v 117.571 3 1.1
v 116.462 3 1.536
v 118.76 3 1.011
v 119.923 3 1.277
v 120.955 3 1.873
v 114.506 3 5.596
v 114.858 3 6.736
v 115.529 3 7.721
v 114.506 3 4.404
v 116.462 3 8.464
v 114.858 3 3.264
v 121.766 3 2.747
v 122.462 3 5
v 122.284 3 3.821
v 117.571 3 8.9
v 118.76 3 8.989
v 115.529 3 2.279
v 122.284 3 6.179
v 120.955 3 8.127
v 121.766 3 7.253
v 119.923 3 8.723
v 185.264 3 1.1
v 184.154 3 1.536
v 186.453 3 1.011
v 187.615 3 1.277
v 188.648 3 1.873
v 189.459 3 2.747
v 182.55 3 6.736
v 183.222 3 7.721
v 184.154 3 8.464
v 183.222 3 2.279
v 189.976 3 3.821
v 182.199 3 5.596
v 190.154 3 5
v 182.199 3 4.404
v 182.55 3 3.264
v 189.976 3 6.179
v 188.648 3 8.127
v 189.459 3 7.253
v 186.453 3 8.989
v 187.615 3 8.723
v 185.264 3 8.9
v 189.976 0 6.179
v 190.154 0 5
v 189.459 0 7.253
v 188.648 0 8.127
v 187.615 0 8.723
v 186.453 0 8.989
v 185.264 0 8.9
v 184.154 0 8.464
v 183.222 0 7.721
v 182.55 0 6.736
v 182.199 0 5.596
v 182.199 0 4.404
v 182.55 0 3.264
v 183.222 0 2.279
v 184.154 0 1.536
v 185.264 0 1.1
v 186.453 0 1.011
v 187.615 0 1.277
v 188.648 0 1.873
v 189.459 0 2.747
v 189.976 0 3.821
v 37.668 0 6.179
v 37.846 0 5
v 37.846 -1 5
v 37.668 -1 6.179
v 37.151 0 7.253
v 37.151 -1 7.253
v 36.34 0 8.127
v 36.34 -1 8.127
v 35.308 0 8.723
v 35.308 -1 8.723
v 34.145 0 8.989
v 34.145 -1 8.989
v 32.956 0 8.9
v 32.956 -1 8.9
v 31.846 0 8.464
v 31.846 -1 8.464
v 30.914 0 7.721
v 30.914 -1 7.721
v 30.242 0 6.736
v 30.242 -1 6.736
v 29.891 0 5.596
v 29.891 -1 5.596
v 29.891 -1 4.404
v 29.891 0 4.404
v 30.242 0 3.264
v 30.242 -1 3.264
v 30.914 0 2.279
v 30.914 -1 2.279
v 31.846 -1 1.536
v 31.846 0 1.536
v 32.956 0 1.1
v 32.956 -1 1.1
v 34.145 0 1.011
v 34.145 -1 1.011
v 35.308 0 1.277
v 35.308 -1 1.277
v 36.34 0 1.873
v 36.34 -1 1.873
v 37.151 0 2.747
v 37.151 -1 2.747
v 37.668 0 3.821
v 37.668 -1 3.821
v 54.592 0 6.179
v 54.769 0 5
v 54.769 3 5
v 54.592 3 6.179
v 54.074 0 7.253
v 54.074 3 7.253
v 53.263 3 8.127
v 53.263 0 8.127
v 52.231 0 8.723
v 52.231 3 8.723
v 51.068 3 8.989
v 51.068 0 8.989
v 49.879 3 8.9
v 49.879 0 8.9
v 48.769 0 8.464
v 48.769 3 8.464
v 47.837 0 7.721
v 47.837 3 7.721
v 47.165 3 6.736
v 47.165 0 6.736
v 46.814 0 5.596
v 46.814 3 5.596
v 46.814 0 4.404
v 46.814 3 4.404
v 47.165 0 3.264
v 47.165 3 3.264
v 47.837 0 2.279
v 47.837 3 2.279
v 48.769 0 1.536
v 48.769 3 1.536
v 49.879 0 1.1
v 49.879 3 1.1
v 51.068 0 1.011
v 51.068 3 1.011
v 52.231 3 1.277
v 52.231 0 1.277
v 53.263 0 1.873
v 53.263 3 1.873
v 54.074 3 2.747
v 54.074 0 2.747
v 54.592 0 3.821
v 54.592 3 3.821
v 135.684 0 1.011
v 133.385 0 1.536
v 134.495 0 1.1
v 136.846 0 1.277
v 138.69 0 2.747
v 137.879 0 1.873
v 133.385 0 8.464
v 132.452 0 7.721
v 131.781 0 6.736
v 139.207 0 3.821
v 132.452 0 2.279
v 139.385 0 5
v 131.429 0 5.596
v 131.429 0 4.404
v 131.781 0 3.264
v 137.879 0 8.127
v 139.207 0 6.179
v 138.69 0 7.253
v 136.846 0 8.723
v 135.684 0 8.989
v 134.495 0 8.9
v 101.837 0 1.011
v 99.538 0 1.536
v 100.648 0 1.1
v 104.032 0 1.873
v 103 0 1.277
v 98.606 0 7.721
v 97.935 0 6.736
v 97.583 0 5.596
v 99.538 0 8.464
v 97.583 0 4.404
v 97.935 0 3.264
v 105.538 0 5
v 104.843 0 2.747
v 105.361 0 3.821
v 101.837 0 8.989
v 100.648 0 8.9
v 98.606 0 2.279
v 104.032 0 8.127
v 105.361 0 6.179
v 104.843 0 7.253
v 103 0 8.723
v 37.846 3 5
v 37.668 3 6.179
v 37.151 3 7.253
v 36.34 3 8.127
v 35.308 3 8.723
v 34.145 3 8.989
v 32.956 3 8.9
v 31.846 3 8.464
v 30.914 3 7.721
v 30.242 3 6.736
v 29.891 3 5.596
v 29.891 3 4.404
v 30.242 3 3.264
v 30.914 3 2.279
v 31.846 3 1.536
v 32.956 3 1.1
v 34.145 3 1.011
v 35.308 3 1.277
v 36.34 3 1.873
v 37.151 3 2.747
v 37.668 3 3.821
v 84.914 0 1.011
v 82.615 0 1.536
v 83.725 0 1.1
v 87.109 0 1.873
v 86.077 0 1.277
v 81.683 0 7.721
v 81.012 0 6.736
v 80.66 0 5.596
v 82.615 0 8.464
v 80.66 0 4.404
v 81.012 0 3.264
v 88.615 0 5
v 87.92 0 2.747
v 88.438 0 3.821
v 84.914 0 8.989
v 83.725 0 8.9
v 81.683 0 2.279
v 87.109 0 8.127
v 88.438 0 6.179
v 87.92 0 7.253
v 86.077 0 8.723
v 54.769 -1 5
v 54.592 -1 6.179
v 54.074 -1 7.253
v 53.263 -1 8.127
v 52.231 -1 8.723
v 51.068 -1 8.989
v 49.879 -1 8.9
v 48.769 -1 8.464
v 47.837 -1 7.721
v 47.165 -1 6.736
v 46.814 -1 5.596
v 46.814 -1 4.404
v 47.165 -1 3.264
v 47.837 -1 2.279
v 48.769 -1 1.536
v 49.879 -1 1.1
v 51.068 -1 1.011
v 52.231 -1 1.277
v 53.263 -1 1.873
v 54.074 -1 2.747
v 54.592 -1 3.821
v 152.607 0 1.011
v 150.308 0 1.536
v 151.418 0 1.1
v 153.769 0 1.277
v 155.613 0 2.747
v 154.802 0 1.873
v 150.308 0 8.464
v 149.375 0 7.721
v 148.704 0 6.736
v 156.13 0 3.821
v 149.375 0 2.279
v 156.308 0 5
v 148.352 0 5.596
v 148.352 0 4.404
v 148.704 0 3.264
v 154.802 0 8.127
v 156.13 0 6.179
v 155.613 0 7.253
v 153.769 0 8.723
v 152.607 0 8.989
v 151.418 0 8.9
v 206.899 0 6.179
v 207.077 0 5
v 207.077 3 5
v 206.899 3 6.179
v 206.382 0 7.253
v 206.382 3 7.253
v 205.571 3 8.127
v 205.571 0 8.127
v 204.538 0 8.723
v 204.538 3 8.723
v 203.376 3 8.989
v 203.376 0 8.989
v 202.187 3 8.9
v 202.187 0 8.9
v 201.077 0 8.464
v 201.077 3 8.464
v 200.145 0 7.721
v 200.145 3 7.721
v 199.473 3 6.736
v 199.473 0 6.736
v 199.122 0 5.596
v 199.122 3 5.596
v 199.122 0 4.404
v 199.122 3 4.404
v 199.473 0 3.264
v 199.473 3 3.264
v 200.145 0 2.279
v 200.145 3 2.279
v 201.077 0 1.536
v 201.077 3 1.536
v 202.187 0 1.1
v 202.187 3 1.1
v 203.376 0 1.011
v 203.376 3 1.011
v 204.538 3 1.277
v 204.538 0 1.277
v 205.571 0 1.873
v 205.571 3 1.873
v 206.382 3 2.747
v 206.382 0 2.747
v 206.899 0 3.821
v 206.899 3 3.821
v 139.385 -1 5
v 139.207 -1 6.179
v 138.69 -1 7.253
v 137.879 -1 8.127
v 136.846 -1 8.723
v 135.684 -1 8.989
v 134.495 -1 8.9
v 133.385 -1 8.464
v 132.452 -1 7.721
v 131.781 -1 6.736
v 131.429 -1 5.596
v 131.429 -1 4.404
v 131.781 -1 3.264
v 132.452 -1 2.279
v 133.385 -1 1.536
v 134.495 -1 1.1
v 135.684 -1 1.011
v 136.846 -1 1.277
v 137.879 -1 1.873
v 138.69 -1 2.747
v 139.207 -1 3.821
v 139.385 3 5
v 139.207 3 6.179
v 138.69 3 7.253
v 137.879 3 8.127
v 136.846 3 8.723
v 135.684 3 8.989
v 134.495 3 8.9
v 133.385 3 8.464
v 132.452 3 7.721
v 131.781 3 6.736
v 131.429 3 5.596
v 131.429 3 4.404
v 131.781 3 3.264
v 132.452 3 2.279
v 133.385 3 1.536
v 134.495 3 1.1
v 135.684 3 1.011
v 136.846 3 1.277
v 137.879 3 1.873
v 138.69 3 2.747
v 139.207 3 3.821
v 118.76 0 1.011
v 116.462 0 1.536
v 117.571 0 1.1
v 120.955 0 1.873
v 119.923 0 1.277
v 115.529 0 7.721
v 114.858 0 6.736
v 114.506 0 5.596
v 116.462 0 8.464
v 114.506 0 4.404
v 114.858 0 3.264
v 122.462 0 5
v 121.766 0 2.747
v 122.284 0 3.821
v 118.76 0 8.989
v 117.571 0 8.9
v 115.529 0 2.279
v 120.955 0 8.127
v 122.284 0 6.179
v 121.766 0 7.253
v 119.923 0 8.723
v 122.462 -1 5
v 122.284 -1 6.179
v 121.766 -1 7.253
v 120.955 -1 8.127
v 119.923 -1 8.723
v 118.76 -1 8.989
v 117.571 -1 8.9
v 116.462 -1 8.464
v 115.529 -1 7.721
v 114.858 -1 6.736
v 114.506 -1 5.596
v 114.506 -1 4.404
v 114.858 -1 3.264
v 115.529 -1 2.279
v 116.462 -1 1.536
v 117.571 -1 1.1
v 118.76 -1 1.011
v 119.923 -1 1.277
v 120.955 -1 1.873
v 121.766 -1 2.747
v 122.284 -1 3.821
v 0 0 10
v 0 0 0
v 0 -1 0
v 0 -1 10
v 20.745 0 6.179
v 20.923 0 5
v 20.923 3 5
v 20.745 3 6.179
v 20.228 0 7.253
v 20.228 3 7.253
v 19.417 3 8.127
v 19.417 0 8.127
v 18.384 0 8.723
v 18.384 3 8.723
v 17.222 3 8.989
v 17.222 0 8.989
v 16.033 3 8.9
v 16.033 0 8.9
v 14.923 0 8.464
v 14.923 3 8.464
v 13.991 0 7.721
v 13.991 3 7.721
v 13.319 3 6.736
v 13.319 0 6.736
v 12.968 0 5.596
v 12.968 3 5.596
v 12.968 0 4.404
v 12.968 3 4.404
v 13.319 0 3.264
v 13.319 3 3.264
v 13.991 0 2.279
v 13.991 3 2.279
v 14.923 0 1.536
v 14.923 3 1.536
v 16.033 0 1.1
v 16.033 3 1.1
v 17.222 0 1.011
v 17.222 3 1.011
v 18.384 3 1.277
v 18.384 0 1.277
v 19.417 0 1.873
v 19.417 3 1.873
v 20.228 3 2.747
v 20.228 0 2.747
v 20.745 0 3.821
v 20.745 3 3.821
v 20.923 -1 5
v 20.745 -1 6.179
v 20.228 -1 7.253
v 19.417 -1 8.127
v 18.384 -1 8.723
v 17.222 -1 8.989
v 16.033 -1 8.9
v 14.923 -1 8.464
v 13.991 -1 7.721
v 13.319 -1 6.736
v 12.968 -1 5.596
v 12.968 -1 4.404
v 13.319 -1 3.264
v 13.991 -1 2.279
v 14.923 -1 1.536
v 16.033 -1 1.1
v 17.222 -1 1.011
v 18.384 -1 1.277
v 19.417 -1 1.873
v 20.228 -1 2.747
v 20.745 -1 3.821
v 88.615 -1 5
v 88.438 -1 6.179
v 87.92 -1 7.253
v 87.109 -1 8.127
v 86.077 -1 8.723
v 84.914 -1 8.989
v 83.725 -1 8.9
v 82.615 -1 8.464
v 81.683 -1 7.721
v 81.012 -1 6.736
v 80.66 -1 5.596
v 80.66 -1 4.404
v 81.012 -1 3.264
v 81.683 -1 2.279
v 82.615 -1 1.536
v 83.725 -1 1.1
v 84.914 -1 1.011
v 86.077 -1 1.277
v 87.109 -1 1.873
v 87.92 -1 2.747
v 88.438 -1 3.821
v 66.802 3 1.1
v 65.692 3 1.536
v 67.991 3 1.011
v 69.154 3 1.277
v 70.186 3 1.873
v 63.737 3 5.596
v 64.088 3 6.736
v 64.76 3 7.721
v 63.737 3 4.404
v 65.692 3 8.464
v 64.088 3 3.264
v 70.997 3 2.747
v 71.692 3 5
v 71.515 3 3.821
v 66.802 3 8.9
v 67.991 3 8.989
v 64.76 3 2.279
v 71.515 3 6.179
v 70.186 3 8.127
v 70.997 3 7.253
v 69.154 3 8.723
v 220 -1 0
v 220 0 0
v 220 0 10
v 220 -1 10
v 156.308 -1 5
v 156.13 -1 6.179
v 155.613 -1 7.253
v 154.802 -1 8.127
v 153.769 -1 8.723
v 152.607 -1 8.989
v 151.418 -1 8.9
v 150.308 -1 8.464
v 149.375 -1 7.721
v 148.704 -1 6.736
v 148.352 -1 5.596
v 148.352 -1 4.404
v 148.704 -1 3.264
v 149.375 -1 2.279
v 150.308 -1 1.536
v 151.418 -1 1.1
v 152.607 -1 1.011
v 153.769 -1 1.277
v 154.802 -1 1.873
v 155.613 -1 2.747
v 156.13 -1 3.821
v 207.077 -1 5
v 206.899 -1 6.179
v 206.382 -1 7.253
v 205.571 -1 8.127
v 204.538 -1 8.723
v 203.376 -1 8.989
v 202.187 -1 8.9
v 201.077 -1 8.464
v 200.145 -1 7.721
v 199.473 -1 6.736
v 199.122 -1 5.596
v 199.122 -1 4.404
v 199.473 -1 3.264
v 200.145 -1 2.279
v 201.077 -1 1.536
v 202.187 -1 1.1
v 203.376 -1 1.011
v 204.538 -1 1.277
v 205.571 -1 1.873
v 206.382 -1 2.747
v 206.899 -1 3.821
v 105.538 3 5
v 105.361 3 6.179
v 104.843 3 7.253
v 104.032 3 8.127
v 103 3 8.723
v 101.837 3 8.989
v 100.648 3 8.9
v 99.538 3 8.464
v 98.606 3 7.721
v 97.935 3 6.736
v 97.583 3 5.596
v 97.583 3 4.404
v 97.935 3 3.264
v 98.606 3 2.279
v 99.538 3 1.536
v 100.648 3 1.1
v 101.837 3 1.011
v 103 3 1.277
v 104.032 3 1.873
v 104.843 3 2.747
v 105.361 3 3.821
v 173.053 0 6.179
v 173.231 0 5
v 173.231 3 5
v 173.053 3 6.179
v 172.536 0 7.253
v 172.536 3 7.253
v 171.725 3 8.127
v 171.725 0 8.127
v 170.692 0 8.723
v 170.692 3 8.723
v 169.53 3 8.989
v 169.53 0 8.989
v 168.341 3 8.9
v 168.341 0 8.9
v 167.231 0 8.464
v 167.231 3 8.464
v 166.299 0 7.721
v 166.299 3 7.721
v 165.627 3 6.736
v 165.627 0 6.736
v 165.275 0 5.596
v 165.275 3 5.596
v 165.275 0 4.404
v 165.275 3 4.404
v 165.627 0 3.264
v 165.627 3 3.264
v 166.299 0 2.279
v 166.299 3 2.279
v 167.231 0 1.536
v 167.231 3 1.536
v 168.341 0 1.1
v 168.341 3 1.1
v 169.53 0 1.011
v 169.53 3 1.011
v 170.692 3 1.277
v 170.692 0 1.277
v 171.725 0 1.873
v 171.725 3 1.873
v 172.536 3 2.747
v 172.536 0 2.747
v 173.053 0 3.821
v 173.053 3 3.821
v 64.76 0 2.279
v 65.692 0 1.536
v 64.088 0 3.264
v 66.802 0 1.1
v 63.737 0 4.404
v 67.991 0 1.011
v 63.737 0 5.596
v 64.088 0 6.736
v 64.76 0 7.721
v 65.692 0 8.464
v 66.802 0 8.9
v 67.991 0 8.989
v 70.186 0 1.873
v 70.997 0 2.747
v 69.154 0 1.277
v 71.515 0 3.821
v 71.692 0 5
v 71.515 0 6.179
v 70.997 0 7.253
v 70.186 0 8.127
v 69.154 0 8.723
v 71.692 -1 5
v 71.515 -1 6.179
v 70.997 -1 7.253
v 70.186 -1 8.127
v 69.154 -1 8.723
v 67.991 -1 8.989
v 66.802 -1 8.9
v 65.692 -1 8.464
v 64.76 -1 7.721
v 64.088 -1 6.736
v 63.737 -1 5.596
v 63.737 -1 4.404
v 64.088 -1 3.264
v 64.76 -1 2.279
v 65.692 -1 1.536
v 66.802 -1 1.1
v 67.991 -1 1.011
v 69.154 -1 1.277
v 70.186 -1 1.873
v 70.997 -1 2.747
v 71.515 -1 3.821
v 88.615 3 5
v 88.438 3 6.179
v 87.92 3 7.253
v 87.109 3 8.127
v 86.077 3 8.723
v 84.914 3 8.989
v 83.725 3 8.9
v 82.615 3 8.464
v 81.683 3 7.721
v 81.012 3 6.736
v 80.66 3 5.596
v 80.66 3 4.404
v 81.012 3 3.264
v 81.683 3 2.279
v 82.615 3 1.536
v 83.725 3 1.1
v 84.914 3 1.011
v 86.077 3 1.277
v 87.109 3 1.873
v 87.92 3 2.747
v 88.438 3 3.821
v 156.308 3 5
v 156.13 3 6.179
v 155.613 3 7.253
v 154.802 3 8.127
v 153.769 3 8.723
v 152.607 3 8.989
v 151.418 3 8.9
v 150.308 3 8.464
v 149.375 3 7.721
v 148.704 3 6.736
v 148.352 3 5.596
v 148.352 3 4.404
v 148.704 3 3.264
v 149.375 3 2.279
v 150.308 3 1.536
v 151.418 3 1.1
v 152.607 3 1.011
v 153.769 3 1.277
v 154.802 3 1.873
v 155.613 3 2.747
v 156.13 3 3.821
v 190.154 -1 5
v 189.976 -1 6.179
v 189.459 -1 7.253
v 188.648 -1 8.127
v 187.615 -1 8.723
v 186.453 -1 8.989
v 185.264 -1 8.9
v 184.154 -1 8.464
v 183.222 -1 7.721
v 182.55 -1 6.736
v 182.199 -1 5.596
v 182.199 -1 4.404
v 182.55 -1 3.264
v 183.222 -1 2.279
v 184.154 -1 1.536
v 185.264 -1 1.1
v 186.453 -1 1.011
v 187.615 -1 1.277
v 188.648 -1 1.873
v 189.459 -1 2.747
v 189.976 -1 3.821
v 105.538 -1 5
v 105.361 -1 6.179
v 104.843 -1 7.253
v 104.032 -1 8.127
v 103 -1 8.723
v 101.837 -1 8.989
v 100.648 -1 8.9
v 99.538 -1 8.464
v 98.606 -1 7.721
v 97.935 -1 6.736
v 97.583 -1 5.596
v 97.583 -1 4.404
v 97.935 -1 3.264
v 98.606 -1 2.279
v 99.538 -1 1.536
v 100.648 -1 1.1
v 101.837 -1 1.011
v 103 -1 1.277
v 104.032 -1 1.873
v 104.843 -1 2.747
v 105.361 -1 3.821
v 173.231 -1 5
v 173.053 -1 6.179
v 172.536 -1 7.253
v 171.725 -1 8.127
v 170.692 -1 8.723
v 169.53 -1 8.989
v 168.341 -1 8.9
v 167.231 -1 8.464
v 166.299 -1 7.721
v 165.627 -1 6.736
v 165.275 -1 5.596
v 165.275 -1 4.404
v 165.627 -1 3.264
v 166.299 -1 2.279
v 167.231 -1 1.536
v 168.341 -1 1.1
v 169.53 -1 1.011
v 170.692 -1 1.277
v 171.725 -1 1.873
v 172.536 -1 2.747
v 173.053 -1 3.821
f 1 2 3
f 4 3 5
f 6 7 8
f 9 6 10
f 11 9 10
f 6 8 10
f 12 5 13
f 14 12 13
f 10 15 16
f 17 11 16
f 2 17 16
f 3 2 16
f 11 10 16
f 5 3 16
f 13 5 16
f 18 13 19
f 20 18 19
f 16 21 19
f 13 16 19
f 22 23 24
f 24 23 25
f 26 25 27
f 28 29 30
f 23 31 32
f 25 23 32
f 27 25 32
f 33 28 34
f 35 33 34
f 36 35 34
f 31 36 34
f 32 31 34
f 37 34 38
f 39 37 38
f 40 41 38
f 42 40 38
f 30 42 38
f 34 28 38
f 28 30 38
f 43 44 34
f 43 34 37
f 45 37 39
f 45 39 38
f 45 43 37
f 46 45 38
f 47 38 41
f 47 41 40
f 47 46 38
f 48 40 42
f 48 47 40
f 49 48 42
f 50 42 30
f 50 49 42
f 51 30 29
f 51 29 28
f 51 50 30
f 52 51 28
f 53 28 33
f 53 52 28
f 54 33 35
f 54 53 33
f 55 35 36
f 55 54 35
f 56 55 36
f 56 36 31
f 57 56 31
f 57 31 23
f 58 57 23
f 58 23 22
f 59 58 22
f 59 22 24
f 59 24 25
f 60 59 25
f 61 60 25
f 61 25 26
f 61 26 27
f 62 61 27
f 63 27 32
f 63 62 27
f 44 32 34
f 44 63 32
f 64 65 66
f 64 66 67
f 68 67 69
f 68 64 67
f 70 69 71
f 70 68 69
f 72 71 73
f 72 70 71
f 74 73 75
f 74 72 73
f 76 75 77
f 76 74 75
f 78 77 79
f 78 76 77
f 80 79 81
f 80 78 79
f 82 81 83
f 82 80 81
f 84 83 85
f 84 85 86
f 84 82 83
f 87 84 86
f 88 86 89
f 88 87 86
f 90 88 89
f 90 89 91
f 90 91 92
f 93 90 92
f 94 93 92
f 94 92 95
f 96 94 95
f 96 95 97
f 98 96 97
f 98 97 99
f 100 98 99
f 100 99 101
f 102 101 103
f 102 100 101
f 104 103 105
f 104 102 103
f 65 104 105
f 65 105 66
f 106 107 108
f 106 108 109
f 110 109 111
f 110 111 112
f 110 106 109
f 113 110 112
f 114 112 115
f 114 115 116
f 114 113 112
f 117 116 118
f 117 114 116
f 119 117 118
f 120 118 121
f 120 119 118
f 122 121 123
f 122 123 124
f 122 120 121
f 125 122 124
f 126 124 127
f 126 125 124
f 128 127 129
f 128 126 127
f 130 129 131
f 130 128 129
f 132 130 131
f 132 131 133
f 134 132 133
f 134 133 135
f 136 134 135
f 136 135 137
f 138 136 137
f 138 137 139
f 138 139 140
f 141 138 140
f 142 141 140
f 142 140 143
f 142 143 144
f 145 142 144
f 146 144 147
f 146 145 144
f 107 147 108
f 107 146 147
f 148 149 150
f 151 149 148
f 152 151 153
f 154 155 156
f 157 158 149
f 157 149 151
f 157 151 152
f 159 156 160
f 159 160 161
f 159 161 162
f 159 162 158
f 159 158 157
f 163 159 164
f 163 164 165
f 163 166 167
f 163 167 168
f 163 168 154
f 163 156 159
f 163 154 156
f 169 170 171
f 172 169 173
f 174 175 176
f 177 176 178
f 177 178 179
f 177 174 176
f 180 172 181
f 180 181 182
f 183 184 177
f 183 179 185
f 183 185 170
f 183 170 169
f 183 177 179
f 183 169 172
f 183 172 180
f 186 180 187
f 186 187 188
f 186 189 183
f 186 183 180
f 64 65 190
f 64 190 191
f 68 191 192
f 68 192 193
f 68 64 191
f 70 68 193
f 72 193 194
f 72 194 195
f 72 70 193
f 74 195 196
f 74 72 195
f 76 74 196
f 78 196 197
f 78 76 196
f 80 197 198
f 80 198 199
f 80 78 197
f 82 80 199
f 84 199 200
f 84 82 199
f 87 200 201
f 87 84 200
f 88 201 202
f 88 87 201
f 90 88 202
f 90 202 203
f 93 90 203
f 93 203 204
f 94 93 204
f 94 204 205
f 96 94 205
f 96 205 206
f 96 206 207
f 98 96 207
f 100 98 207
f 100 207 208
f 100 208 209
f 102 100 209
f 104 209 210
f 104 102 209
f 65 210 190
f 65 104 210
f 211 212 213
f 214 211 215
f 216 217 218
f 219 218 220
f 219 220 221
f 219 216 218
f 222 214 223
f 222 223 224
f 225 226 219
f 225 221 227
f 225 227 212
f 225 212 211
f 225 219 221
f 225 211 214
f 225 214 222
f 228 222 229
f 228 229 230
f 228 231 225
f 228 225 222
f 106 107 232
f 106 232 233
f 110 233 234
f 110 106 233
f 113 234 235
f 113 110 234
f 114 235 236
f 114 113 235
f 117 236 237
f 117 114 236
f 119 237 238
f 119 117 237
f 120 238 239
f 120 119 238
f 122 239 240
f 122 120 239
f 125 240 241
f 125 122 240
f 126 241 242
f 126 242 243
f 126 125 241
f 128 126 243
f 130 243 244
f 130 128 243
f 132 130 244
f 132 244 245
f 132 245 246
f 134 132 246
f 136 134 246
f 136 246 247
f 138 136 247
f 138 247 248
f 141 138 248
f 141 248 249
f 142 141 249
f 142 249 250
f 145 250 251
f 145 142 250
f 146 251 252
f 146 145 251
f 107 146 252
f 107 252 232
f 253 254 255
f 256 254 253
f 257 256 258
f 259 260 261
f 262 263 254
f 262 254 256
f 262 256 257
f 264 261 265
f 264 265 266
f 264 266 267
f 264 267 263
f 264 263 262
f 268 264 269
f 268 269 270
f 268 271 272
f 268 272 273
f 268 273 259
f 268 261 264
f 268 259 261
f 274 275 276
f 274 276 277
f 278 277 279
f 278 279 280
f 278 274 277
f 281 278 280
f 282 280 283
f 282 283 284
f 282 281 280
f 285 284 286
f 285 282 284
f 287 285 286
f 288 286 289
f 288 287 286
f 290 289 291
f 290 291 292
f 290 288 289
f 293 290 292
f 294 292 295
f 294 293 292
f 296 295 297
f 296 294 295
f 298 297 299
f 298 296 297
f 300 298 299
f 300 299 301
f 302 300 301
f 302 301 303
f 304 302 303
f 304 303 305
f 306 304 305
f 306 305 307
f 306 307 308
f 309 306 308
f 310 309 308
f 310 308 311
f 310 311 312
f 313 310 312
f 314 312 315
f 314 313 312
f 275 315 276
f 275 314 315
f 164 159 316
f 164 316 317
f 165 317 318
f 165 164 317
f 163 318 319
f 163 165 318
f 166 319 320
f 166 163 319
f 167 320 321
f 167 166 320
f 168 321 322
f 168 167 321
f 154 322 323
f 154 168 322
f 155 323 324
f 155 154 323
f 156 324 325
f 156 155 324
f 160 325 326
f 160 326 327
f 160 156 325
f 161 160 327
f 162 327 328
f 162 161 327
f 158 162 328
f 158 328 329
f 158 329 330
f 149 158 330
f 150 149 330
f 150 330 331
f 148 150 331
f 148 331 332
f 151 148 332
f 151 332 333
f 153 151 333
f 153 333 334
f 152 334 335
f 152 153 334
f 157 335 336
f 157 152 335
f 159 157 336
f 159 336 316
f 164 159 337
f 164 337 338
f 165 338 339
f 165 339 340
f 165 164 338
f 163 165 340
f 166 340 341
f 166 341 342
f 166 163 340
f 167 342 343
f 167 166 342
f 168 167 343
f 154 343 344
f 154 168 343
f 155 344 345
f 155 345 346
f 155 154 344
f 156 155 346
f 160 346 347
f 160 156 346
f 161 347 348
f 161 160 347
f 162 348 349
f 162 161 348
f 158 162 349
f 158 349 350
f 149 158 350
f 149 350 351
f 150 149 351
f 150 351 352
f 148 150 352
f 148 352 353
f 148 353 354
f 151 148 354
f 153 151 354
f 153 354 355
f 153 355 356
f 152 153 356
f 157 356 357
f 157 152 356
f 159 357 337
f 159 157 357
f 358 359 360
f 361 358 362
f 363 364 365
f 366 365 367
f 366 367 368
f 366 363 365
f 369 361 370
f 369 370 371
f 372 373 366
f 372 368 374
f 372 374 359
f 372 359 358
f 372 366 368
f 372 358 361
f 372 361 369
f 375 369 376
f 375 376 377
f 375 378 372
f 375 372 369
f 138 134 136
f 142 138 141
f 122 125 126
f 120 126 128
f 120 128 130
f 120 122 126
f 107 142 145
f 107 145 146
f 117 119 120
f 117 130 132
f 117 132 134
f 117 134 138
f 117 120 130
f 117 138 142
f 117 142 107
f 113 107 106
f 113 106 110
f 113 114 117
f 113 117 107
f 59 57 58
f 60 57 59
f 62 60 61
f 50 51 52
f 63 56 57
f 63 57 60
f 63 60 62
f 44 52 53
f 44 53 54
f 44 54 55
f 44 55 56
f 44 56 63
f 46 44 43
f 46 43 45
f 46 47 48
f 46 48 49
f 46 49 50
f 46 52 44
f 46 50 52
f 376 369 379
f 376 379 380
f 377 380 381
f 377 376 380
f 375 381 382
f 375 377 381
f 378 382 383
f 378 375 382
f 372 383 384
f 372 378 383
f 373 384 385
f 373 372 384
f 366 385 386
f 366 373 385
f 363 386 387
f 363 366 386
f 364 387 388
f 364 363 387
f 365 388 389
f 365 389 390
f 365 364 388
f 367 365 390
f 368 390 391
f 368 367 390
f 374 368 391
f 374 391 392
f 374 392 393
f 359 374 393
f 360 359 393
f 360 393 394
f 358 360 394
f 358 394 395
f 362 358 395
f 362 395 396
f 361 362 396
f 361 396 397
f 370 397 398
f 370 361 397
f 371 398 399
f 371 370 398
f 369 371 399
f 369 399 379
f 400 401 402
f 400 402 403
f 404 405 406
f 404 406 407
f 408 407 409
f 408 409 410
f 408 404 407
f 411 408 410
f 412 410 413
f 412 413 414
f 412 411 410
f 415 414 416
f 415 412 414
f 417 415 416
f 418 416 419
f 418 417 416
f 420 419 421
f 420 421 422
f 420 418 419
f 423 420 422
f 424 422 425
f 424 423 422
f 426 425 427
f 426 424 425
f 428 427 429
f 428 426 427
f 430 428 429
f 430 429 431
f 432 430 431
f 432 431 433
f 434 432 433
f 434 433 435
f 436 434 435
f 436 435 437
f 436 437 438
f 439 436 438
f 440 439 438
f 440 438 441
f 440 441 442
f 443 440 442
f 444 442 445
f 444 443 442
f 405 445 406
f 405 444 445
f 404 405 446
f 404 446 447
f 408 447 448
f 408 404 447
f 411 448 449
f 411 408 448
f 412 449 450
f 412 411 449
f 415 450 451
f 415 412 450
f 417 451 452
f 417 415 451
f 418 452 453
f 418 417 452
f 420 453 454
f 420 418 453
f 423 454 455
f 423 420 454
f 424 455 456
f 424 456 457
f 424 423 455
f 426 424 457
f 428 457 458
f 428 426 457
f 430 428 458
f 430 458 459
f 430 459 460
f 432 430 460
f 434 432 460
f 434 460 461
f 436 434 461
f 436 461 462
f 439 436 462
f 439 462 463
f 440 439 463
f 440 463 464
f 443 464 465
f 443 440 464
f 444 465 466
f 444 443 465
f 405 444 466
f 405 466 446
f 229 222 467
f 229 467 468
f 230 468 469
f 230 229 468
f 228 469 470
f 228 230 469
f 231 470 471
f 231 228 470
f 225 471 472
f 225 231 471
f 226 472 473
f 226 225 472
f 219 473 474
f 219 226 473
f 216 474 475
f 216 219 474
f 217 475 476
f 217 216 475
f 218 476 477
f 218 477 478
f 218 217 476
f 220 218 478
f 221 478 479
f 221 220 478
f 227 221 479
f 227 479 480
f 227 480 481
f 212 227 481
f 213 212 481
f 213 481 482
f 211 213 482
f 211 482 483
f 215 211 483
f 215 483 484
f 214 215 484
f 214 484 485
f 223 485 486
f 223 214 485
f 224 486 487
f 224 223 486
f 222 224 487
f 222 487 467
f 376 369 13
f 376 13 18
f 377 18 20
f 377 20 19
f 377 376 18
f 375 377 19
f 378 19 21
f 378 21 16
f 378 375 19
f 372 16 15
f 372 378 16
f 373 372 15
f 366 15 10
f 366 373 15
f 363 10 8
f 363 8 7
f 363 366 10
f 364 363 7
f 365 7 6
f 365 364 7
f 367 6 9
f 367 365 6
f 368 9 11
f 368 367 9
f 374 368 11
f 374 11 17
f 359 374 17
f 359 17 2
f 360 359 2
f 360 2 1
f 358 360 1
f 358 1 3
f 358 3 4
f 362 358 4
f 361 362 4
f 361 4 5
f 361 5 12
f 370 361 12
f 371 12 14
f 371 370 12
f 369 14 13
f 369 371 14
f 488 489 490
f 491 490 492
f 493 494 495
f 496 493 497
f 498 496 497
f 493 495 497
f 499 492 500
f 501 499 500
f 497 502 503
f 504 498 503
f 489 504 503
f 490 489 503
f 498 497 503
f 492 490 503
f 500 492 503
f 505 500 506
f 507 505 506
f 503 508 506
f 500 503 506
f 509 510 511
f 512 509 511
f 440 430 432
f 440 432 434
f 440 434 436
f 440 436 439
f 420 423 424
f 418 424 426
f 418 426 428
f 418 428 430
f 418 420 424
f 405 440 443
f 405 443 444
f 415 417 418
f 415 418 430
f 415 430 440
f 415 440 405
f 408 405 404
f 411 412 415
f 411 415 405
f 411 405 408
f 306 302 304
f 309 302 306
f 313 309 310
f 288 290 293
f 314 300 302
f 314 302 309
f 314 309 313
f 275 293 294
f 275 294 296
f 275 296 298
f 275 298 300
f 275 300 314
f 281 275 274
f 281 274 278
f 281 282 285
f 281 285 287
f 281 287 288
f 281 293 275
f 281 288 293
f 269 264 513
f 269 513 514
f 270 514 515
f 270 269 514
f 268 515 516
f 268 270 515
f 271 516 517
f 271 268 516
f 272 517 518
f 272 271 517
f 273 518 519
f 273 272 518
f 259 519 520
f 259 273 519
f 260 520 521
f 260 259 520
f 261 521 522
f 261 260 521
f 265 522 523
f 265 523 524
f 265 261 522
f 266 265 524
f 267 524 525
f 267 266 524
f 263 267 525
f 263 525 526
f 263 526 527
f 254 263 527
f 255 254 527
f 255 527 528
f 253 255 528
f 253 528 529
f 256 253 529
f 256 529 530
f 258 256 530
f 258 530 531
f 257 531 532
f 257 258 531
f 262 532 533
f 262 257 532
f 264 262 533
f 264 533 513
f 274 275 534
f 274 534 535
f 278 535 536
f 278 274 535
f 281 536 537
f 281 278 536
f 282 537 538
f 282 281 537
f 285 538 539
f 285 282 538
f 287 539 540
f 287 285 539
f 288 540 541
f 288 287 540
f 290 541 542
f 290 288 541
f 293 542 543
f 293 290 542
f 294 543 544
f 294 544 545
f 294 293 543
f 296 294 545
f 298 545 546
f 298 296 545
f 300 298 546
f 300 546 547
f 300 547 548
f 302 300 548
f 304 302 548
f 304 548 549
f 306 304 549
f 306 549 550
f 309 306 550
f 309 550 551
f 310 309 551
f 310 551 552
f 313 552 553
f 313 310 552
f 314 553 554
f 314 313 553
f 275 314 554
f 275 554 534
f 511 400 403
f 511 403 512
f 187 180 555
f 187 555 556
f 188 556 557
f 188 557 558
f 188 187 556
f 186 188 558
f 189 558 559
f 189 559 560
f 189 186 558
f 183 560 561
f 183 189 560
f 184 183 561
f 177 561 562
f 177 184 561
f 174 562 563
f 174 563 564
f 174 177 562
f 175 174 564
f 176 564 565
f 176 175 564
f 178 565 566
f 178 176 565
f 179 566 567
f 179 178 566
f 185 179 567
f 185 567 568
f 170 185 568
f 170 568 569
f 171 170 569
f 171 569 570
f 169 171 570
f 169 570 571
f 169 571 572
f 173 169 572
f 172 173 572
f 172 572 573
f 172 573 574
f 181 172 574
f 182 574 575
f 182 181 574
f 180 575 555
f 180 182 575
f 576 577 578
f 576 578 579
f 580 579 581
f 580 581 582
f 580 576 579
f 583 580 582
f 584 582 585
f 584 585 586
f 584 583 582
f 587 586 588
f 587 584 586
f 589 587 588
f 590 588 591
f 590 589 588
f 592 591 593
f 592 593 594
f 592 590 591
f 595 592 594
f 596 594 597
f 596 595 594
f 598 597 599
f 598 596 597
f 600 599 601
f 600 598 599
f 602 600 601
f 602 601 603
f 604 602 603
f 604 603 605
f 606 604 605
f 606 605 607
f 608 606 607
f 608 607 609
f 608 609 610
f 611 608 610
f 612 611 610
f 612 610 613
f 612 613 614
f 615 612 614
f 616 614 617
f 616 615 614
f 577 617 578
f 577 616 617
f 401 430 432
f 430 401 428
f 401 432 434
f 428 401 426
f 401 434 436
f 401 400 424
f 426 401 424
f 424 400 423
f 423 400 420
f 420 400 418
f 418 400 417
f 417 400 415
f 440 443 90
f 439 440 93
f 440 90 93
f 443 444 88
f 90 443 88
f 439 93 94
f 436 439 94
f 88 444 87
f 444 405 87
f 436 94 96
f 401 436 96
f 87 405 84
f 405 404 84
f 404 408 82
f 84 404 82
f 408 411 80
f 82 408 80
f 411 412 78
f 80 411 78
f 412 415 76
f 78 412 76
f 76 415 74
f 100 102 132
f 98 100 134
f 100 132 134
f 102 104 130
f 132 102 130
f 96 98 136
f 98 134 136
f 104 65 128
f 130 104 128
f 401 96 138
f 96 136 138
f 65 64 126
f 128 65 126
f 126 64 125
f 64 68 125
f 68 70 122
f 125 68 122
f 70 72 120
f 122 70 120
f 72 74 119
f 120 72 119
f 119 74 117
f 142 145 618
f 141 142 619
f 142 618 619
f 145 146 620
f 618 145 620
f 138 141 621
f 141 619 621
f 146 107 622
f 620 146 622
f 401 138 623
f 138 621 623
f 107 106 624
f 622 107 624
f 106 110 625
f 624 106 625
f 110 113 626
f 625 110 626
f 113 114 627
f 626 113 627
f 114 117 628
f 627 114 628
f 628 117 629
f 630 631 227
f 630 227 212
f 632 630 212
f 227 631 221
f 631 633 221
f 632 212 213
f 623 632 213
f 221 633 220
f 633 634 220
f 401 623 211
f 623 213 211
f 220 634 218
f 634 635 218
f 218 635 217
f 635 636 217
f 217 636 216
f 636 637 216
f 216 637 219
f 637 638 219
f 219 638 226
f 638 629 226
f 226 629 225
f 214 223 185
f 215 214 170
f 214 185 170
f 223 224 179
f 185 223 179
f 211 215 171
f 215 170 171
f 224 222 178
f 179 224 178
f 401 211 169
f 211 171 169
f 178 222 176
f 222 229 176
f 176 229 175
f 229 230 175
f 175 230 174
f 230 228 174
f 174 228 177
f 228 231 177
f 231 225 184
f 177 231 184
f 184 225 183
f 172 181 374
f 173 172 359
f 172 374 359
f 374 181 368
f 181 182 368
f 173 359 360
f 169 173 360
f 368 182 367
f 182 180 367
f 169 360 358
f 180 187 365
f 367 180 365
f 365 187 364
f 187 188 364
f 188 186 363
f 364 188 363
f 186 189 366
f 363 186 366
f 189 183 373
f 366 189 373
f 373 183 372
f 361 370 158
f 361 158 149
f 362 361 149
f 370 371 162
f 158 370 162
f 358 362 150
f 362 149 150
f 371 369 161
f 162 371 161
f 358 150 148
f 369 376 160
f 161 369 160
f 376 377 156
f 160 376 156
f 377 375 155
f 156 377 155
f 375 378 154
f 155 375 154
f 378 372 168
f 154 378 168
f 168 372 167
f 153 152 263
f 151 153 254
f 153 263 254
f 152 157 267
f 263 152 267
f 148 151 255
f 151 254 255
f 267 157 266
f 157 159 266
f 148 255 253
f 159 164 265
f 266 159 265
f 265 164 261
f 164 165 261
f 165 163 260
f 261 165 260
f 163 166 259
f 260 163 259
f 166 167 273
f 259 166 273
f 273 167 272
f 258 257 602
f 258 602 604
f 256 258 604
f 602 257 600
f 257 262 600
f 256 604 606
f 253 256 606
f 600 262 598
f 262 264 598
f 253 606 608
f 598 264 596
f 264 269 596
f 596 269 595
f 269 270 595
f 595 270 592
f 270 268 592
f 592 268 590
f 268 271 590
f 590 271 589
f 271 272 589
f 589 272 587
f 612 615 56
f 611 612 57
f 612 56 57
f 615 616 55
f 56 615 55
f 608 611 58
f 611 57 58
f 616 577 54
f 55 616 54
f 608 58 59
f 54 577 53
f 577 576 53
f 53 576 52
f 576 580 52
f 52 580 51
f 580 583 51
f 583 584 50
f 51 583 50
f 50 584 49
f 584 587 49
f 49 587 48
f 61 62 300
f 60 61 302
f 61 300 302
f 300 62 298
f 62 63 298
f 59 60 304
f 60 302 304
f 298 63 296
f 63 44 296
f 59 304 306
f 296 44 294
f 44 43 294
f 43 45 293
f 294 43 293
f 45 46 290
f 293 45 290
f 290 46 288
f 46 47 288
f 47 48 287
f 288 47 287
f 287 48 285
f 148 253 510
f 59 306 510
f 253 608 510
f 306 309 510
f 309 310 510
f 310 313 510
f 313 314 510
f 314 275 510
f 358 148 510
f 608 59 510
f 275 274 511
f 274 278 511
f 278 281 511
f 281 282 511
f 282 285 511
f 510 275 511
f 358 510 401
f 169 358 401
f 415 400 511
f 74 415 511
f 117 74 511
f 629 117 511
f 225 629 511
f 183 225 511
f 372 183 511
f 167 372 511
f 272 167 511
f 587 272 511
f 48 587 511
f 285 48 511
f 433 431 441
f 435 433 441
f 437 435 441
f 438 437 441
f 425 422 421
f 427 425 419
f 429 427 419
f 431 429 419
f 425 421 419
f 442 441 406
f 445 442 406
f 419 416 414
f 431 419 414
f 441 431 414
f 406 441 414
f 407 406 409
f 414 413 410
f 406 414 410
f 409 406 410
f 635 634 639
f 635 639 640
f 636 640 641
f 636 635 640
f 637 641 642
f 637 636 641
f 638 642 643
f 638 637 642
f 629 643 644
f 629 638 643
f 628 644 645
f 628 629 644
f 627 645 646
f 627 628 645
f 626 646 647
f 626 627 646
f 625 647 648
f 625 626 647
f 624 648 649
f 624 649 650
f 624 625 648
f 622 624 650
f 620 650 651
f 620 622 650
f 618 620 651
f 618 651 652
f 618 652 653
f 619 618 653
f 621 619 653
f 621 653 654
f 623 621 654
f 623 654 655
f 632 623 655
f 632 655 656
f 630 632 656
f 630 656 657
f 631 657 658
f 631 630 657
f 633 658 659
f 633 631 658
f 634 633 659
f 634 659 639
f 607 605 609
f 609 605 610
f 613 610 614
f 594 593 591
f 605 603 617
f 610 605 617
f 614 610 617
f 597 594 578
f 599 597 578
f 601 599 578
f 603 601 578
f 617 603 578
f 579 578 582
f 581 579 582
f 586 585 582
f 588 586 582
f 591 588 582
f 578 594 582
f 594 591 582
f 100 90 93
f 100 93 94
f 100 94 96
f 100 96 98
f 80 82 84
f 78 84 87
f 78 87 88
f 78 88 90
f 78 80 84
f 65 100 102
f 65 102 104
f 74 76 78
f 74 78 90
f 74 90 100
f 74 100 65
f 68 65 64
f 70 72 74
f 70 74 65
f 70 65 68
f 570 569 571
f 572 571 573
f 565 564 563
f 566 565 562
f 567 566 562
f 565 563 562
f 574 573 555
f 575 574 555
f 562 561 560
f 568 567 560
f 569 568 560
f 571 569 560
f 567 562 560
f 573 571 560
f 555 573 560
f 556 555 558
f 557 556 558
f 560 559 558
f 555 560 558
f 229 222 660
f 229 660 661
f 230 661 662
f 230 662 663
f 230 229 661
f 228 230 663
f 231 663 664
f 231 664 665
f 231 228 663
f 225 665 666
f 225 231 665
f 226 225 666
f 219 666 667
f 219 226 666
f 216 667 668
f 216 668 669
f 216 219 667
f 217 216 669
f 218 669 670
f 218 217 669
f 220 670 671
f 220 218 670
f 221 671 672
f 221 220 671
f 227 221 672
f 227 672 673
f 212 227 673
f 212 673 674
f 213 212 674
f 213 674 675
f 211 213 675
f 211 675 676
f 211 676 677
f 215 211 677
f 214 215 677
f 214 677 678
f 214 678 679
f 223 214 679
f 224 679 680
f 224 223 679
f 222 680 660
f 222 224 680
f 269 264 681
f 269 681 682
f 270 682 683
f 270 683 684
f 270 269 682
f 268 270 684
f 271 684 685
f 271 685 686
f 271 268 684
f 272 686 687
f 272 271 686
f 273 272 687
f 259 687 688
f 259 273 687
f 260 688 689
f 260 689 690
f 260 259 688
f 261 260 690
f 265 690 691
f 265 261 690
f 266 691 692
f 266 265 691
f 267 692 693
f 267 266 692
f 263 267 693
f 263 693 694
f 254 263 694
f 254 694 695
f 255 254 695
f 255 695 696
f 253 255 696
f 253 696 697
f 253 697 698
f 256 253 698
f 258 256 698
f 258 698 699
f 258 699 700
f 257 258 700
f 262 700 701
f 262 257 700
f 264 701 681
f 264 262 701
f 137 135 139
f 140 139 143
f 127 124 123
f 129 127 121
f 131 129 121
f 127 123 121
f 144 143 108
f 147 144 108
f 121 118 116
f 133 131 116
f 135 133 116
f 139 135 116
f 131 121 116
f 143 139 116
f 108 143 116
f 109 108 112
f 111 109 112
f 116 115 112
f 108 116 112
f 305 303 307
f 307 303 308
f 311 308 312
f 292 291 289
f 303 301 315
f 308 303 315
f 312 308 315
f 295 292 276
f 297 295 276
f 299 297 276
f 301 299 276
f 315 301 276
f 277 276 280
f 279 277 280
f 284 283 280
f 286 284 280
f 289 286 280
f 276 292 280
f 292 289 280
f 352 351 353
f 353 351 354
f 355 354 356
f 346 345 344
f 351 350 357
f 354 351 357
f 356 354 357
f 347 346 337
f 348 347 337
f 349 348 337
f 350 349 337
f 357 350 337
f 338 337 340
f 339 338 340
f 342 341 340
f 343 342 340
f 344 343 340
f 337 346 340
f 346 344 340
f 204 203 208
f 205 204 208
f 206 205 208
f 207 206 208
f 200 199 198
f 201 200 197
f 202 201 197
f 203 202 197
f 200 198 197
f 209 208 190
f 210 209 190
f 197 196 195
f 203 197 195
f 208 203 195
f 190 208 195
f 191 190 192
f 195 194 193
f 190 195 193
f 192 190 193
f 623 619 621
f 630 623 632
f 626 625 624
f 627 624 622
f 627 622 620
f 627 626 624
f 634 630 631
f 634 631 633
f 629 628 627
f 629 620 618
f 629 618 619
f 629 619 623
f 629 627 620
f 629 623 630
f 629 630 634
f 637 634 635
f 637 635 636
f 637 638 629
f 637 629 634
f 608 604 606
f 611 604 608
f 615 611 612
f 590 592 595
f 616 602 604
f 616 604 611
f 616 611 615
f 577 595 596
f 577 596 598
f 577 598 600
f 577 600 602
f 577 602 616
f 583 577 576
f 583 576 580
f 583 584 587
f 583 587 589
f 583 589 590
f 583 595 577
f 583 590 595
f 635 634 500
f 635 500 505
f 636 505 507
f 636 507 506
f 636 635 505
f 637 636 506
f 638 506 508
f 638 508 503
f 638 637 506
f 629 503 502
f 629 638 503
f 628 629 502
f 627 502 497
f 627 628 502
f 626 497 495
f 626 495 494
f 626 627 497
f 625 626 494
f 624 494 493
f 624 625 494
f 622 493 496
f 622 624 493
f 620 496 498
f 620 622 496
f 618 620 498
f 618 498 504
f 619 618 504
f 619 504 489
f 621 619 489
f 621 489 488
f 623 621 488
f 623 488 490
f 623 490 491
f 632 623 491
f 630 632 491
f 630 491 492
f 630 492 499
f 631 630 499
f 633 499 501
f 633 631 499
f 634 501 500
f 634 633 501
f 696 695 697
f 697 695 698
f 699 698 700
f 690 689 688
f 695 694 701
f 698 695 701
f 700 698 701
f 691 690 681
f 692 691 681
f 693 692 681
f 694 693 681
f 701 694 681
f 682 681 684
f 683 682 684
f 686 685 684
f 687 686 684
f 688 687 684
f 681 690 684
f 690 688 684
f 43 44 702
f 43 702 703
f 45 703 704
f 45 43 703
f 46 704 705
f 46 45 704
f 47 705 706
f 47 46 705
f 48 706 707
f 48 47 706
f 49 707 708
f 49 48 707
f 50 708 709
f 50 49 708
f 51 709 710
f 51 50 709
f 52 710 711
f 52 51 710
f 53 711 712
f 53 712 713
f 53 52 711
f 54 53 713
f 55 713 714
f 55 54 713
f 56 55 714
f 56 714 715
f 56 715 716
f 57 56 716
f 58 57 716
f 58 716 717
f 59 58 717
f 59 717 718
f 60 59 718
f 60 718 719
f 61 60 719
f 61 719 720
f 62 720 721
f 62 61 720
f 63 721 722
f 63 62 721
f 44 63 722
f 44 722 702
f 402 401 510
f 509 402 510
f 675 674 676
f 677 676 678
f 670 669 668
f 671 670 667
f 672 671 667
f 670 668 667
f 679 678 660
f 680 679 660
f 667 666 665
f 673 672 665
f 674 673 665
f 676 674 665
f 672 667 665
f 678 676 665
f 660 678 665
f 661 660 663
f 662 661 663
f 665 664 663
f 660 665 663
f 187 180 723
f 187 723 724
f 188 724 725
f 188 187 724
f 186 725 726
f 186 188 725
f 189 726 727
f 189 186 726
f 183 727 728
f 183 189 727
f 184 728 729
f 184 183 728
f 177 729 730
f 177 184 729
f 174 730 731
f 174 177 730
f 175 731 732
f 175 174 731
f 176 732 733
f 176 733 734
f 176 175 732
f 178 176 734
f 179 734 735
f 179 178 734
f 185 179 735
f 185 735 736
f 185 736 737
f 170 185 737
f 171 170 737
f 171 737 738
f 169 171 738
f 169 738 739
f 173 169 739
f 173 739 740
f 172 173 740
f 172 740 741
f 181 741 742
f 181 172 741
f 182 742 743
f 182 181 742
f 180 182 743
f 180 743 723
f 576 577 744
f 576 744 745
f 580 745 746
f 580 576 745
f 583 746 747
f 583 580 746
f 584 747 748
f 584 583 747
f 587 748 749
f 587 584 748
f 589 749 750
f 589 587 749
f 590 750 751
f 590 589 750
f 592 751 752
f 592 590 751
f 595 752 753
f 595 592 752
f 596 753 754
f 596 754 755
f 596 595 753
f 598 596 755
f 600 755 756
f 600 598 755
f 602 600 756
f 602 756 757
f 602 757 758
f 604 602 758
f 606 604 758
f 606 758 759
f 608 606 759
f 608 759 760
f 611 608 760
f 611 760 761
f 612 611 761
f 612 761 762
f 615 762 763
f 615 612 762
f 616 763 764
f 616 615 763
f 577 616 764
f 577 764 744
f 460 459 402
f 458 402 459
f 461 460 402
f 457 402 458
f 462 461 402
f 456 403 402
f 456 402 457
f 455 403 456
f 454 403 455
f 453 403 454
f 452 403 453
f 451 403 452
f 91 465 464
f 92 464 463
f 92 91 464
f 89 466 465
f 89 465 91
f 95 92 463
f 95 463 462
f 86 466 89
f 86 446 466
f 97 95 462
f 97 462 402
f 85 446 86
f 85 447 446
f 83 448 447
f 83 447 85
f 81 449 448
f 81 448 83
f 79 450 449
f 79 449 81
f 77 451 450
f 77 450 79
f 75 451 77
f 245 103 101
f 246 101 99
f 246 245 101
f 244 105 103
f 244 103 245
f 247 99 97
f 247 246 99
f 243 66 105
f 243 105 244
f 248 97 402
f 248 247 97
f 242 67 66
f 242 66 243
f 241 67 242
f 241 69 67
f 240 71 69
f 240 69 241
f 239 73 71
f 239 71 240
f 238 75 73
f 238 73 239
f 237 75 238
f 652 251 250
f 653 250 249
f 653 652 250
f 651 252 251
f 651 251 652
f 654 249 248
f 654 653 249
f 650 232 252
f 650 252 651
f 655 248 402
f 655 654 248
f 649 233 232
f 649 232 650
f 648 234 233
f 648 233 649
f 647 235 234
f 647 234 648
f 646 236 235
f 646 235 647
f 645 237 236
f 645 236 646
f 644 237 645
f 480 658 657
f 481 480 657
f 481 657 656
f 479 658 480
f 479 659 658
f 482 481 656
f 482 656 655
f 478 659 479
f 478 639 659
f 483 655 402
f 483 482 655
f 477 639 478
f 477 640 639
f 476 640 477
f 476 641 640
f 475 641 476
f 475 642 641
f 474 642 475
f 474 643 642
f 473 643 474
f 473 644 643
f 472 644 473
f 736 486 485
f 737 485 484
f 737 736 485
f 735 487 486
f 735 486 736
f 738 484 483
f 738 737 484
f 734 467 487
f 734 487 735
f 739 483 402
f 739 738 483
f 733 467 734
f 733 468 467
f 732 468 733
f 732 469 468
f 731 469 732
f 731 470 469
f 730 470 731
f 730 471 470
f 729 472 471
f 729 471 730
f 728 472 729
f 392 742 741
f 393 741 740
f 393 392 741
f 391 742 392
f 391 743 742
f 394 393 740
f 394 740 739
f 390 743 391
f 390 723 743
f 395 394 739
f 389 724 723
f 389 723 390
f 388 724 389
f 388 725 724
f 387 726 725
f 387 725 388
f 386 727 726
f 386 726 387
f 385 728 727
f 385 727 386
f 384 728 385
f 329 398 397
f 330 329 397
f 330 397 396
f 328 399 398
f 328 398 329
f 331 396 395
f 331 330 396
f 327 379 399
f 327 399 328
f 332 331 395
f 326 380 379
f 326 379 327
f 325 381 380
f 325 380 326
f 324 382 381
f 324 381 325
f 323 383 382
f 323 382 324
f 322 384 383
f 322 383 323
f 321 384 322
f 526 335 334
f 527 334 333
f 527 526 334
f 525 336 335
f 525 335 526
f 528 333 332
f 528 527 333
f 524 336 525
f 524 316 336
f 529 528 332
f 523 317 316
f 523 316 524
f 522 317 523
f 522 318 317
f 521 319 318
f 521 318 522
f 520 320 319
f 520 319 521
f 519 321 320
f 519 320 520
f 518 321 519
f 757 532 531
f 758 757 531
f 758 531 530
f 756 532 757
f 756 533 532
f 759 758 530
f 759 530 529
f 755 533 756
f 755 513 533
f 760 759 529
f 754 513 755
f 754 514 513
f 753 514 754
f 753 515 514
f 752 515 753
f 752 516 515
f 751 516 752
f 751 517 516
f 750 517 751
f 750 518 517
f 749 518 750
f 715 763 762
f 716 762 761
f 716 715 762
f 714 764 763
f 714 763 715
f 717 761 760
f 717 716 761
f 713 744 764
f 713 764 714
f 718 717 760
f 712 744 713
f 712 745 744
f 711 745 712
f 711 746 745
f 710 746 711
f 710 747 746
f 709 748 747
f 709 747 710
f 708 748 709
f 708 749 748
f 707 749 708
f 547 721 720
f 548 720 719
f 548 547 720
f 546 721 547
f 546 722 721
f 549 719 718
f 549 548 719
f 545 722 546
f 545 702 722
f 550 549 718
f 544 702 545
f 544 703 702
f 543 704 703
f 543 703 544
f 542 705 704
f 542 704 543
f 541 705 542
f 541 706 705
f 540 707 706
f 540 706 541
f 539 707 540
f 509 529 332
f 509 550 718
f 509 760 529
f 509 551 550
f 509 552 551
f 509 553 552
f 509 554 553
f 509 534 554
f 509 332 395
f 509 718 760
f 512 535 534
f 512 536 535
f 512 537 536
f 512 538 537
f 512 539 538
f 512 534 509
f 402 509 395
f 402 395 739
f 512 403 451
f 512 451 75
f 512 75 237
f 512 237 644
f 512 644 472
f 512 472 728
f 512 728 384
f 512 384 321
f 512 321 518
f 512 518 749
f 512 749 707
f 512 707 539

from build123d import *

# Parameters (mm, degrees)
F0_W     = 220
F0_H     = 10
F0_R     = 4
F1_DEPTH = 1
F2_DEPTH = 3


with BuildPart() as f1:
    # F0 (on Front) → F1 (new body)
    with BuildSketch(Plane.XZ):
        with Locations((110, 5)):
            Rectangle(F0_W, F0_H)
        with Locations((16.923077, 5)):
            Circle(F0_R, mode=Mode.SUBTRACT)
        with Locations((33.846154, 5)):
            Circle(F0_R, mode=Mode.SUBTRACT)
        with Locations((50.769231, 5)):
            Circle(F0_R, mode=Mode.SUBTRACT)
        with Locations((67.692308, 5)):
            Circle(F0_R, mode=Mode.SUBTRACT)
        with Locations((84.615385, 5)):
            Circle(F0_R, mode=Mode.SUBTRACT)
        with Locations((101.538462, 5)):
            Circle(F0_R, mode=Mode.SUBTRACT)
        with Locations((118.461538, 5)):
            Circle(F0_R, mode=Mode.SUBTRACT)
        with Locations((135.384615, 5)):
            Circle(F0_R, mode=Mode.SUBTRACT)
        with Locations((152.307692, 5)):
            Circle(F0_R, mode=Mode.SUBTRACT)
        with Locations((169.230769, 5)):
            Circle(F0_R, mode=Mode.SUBTRACT)
        with Locations((186.153846, 5)):
            Circle(F0_R, mode=Mode.SUBTRACT)
        with Locations((203.076923, 5)):
            Circle(F0_R, mode=Mode.SUBTRACT)
    extrude(amount=F1_DEPTH)

    # F0 (on Front) → F2 (join)
    with BuildSketch(Plane.XZ):
        with Locations((16.923077, 5)):
            Circle(F0_R)
        with Locations((33.846154, 5)):
            Circle(F0_R)
        with Locations((50.769231, 5)):
            Circle(F0_R)
        with Locations((67.692308, 5)):
            Circle(F0_R)
        with Locations((84.615385, 5)):
            Circle(F0_R)
        with Locations((101.538462, 5)):
            Circle(F0_R)
        with Locations((135.384615, 5)):
            Circle(F0_R)
        with Locations((118.461538, 5)):
            Circle(F0_R)
        with Locations((152.307692, 5)):
            Circle(F0_R)
        with Locations((203.076923, 5)):
            Circle(F0_R)
        with Locations((169.230769, 5)):
            Circle(F0_R)
        with Locations((186.153846, 5)):
            Circle(F0_R)
    extrude(amount=-F2_DEPTH)


solid = f1.part
